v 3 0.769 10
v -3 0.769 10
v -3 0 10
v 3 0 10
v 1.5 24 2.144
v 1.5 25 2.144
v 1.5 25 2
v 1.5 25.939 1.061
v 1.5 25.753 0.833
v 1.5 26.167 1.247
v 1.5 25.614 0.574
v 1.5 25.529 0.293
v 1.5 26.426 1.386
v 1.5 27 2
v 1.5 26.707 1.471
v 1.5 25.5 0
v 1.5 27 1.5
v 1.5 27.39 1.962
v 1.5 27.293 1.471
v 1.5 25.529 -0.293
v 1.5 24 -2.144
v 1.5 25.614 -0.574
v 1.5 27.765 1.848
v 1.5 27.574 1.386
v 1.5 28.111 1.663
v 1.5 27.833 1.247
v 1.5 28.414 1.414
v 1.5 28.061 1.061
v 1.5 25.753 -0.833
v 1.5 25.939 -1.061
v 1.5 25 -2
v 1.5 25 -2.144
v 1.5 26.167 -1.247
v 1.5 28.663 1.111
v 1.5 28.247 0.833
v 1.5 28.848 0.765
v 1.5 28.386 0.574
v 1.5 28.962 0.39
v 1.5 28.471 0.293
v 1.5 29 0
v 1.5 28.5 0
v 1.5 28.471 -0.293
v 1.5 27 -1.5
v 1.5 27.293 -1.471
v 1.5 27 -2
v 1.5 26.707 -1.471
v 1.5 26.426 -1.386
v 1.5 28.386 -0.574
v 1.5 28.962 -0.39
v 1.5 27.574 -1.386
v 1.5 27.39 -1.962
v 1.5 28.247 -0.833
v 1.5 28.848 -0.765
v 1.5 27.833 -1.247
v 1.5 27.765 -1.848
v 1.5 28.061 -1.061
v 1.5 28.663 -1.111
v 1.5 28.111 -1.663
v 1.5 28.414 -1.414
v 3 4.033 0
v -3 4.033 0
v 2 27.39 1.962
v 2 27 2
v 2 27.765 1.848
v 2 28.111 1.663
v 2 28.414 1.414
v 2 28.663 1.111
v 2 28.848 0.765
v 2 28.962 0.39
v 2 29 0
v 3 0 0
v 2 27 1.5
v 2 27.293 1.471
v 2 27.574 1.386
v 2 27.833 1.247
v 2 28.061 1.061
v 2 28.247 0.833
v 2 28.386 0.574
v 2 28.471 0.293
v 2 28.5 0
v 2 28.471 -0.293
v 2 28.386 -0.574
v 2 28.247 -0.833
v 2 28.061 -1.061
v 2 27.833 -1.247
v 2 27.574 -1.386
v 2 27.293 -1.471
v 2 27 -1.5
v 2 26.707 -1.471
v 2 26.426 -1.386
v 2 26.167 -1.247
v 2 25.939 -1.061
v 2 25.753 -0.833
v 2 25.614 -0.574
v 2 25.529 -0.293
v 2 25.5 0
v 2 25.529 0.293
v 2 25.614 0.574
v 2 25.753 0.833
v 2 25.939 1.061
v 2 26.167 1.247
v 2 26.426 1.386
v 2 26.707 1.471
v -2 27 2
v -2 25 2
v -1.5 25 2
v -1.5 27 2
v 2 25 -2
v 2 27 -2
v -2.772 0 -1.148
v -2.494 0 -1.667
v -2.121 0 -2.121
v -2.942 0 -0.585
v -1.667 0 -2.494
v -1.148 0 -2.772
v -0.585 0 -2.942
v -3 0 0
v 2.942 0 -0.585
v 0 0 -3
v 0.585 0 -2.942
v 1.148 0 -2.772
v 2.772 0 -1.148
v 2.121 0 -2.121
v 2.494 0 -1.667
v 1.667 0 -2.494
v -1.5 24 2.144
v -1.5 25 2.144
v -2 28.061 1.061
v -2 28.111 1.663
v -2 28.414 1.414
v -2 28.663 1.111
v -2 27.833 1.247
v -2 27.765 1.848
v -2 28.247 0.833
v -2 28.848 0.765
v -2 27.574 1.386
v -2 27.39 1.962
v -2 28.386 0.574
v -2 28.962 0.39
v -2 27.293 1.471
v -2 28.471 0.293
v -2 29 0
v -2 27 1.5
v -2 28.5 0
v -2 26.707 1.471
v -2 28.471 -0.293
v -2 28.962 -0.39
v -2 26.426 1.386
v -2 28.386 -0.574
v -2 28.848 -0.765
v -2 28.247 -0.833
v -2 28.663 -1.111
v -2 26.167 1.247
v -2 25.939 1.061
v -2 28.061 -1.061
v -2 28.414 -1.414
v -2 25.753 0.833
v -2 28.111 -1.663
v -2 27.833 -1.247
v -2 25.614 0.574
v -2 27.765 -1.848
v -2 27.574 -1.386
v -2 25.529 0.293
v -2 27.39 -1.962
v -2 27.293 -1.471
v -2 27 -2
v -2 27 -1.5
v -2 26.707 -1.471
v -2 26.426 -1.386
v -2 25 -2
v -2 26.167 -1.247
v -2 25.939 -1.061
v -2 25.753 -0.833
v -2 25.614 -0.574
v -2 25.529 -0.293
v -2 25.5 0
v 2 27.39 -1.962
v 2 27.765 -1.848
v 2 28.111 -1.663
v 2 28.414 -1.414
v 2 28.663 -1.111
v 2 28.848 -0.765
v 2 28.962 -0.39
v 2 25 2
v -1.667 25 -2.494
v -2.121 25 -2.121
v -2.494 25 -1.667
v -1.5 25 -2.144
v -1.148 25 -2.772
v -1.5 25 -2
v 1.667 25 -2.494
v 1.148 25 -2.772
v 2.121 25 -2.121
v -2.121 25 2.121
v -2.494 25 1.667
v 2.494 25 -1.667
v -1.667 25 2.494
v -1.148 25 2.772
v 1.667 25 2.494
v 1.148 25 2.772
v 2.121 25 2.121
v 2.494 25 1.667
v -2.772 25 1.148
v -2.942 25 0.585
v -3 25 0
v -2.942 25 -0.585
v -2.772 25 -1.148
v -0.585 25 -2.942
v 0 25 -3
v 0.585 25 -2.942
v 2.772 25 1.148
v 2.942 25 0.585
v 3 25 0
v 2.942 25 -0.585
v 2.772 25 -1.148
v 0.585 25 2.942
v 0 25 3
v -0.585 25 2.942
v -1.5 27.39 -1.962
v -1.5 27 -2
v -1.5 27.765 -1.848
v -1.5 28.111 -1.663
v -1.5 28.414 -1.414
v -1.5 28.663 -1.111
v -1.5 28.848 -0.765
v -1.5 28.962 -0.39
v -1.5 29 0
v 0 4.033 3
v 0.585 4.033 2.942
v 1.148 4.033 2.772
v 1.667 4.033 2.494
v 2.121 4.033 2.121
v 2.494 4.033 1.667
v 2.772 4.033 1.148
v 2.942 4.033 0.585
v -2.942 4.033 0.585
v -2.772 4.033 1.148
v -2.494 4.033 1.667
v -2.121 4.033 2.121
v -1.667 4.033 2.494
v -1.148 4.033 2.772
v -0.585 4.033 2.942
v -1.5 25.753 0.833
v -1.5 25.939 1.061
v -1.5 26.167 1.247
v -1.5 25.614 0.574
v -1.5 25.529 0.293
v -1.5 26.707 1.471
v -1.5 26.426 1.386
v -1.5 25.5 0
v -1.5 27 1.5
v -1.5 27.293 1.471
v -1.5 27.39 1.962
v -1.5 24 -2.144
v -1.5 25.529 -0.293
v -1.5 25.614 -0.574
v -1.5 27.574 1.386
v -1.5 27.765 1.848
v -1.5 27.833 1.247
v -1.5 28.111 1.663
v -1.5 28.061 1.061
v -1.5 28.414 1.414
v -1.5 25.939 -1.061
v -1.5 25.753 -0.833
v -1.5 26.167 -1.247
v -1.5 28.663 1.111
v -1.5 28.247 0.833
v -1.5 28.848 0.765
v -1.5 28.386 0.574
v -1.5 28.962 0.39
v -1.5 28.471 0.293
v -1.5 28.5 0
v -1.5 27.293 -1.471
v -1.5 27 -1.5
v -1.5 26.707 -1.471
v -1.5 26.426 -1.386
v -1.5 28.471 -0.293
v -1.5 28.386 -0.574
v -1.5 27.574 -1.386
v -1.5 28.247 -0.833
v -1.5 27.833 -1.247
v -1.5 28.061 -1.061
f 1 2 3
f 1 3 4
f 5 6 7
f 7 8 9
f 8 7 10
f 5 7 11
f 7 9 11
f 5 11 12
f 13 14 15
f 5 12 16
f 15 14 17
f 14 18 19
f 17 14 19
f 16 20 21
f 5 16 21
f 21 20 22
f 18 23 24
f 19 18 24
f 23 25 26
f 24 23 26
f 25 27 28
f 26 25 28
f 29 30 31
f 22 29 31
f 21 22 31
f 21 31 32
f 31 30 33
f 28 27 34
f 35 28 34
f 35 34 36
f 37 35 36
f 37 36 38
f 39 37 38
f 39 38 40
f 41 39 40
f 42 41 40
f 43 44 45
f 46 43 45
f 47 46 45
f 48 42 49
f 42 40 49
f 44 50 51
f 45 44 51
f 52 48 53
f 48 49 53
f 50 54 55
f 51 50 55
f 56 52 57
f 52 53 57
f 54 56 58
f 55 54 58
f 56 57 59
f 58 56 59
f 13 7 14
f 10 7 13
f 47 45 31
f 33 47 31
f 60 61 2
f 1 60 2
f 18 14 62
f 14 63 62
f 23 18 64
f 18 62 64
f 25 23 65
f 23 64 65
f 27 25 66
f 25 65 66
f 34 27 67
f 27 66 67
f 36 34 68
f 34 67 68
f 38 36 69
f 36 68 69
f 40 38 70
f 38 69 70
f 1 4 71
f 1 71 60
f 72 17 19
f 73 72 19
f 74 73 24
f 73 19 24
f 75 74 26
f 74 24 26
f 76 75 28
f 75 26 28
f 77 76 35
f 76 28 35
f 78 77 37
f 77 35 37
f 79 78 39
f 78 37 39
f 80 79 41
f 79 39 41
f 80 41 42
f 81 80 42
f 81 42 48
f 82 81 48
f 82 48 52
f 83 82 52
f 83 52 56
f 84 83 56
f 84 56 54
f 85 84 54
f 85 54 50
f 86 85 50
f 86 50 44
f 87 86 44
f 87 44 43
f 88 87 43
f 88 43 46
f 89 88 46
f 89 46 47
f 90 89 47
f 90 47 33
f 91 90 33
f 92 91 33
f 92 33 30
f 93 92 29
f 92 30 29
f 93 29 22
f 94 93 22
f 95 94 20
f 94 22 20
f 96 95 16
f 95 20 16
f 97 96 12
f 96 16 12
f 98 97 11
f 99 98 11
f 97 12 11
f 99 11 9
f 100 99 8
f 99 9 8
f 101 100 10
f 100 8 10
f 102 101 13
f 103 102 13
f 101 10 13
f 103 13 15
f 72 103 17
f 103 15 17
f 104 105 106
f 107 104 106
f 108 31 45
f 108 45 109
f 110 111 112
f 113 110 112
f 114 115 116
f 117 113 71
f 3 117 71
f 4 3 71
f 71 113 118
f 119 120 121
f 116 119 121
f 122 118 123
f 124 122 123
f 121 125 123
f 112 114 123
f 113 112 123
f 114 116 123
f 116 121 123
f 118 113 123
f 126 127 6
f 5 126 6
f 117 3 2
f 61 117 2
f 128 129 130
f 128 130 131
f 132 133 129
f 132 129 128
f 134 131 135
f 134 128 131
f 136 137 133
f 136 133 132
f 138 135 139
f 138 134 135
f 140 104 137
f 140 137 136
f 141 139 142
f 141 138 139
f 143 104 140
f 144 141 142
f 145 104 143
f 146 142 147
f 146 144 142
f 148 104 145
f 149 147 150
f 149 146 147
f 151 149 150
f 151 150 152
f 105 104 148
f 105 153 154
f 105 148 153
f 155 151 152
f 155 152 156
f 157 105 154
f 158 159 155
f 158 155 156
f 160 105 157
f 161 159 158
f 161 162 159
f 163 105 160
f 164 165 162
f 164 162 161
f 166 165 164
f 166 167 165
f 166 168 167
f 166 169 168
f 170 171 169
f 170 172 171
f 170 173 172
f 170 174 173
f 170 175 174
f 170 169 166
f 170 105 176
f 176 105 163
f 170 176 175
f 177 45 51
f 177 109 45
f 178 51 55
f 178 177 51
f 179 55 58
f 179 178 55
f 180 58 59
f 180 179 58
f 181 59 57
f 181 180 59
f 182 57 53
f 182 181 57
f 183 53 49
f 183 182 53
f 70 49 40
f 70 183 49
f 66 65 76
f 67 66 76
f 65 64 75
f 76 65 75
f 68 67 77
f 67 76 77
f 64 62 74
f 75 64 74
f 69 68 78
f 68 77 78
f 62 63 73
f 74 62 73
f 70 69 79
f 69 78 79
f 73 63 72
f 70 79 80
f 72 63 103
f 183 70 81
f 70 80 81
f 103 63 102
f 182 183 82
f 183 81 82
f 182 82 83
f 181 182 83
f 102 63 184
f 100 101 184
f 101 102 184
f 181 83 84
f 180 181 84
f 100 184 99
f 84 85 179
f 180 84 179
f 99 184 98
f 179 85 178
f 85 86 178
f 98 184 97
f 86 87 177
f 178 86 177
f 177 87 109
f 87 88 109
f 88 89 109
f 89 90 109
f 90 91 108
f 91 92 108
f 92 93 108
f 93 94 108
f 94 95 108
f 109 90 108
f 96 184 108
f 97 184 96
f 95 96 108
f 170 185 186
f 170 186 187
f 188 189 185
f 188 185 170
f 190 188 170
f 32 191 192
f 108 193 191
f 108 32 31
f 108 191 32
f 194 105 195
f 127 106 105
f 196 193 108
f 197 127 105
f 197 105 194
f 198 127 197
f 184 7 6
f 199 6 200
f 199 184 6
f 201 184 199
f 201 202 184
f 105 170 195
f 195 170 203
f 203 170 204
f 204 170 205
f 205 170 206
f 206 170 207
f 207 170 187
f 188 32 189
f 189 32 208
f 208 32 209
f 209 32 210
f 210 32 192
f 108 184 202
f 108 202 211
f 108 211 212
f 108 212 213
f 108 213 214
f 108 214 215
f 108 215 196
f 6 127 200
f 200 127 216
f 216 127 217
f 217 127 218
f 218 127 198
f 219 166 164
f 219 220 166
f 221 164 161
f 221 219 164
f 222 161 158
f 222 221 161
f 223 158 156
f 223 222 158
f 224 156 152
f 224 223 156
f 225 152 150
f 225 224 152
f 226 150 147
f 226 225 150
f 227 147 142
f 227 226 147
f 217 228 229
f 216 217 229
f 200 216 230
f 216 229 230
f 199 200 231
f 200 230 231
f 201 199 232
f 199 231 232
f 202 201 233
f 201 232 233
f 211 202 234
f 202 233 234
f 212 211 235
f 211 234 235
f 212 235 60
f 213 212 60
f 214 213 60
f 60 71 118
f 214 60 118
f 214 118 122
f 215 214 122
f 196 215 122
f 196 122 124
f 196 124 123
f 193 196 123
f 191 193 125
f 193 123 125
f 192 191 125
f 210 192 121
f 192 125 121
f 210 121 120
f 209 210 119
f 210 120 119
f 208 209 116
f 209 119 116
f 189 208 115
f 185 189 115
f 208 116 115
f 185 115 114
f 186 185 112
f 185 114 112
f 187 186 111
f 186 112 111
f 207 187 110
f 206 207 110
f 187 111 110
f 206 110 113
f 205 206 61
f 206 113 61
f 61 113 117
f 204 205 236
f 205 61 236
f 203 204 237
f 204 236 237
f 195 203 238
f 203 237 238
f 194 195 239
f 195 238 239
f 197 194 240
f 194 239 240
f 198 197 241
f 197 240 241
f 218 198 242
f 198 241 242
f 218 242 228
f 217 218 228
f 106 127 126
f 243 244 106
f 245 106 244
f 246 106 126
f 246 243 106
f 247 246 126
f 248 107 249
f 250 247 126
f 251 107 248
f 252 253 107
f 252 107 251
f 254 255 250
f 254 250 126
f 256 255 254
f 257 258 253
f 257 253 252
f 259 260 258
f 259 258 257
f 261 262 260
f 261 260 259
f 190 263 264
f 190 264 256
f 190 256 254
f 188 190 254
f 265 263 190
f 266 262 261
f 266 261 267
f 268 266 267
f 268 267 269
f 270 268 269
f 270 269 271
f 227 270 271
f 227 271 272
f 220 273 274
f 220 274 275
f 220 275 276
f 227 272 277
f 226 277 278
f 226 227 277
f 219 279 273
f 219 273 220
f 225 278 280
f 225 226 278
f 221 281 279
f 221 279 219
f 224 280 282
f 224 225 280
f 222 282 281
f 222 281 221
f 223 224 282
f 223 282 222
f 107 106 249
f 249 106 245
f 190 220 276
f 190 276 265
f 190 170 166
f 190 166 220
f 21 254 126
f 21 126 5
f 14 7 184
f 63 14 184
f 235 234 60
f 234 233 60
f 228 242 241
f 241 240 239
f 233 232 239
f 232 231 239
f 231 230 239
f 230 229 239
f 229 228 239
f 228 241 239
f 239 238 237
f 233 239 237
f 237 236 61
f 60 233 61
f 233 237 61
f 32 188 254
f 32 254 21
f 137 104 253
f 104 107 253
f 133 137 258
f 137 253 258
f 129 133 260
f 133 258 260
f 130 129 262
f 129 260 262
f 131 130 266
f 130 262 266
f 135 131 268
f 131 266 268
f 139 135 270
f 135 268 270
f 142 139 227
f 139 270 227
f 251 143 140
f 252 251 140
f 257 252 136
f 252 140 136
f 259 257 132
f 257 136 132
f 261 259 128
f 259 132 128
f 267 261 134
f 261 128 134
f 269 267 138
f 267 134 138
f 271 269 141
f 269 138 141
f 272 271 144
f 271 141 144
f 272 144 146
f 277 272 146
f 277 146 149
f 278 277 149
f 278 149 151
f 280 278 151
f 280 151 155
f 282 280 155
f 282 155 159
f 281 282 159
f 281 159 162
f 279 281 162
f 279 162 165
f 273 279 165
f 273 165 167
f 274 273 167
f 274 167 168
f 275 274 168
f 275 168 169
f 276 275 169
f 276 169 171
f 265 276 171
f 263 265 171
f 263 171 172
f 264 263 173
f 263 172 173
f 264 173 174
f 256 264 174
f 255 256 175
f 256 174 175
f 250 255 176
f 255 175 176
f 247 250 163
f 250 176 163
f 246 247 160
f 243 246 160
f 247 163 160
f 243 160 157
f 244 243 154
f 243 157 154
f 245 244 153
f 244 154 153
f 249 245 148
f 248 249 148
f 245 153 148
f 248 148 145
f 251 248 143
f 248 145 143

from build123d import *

# Parameters (mm, degrees)
SKETCH1_R           = 3
BOSS_EXTRUDE1_DEPTH = 25
SKETCH2_W           = 4
SKETCH2_H           = 4
SKETCH2_W_2         = 3
SKETCH2_H_2         = 3
BOSS_EXTRUDE2_DEPTH = 4
SKETCH3_W           = 3
SKETCH3_H           = 4.288213466
CUT_EXTRUDE1_DEPTH  = 5
SKETCH4_R           = 1.5
CUT_EXTRUDE2_DEPTH  = 5
FILLET1_R           = 2
SKETCH5_W           = 6
SKETCH5_H           = 4.032898641
BOSS_EXTRUDE3_DEPTH = 10
CUT_EXTRUDE4_DEPTH  = 10


with BuildPart() as part:
    # Sketch1 → Boss-Extrude1 (new body)
    with BuildSketch(Plane(origin=(0, 0, 0), x_dir=(1, 0, 0), z_dir=(0, 1, 0))):
        with Locations(Location((0, 0, 0), (0, 0, 270))):
            Circle(SKETCH1_R)
    extrude(amount=BOSS_EXTRUDE1_DEPTH)

    # Sketch2 → Boss-Extrude2 (add)
    with BuildSketch(Plane(origin=(0, 25, 0), x_dir=(1, 0, 0), z_dir=(0, 1, 0))):
        Rectangle(SKETCH2_W, SKETCH2_H)
        Rectangle(SKETCH2_W_2, SKETCH2_H_2, mode=Mode.SUBTRACT)
    extrude(amount=BOSS_EXTRUDE2_DEPTH)

    # Sketch3 → Cut-Extrude1 (cut)
    with BuildSketch(Plane(origin=(0, 29, 0), x_dir=(1, 0, 0), z_dir=(0, 1, 0))):
        Rectangle(SKETCH3_W, SKETCH3_H)
    extrude(amount=-CUT_EXTRUDE1_DEPTH, mode=Mode.SUBTRACT)

    # Sketch4 → Cut-Extrude2 (cut)
    with BuildSketch(Plane.ZY.offset(2)):
        with Locations((0, 27)):
            Circle(SKETCH4_R)
    extrude(amount=-CUT_EXTRUDE2_DEPTH, mode=Mode.SUBTRACT)

    # Fillet1
    fillet1_edges = [part.edges().sort_by_distance(p)[0] for p in [
        (1.75, 29, 2),
        (1.75, 29, -2),
        (-1.75, 29, -2),
        (-1.75, 29, 2),
    ]]
    fillet(fillet1_edges, radius=FILLET1_R - 0.0001)  # a hair under: the kernel refuses the full size

    # Sketch5 → Boss-Extrude3 (add)
    with BuildSketch(Plane.XY):
        with Locations((0, 2.016449321)):
            Rectangle(SKETCH5_W, SKETCH5_H)
    extrude(amount=BOSS_EXTRUDE3_DEPTH)

    # Sketch6 → Cut-Extrude4 (cut)
    with BuildSketch(Plane.ZY.offset(3)):
        Polygon((0, 4.032898641), (10, 0.769169486), (10, 4.032898641), align=None)
    extrude(amount=-CUT_EXTRUDE4_DEPTH, mode=Mode.SUBTRACT)


solid = part.part
